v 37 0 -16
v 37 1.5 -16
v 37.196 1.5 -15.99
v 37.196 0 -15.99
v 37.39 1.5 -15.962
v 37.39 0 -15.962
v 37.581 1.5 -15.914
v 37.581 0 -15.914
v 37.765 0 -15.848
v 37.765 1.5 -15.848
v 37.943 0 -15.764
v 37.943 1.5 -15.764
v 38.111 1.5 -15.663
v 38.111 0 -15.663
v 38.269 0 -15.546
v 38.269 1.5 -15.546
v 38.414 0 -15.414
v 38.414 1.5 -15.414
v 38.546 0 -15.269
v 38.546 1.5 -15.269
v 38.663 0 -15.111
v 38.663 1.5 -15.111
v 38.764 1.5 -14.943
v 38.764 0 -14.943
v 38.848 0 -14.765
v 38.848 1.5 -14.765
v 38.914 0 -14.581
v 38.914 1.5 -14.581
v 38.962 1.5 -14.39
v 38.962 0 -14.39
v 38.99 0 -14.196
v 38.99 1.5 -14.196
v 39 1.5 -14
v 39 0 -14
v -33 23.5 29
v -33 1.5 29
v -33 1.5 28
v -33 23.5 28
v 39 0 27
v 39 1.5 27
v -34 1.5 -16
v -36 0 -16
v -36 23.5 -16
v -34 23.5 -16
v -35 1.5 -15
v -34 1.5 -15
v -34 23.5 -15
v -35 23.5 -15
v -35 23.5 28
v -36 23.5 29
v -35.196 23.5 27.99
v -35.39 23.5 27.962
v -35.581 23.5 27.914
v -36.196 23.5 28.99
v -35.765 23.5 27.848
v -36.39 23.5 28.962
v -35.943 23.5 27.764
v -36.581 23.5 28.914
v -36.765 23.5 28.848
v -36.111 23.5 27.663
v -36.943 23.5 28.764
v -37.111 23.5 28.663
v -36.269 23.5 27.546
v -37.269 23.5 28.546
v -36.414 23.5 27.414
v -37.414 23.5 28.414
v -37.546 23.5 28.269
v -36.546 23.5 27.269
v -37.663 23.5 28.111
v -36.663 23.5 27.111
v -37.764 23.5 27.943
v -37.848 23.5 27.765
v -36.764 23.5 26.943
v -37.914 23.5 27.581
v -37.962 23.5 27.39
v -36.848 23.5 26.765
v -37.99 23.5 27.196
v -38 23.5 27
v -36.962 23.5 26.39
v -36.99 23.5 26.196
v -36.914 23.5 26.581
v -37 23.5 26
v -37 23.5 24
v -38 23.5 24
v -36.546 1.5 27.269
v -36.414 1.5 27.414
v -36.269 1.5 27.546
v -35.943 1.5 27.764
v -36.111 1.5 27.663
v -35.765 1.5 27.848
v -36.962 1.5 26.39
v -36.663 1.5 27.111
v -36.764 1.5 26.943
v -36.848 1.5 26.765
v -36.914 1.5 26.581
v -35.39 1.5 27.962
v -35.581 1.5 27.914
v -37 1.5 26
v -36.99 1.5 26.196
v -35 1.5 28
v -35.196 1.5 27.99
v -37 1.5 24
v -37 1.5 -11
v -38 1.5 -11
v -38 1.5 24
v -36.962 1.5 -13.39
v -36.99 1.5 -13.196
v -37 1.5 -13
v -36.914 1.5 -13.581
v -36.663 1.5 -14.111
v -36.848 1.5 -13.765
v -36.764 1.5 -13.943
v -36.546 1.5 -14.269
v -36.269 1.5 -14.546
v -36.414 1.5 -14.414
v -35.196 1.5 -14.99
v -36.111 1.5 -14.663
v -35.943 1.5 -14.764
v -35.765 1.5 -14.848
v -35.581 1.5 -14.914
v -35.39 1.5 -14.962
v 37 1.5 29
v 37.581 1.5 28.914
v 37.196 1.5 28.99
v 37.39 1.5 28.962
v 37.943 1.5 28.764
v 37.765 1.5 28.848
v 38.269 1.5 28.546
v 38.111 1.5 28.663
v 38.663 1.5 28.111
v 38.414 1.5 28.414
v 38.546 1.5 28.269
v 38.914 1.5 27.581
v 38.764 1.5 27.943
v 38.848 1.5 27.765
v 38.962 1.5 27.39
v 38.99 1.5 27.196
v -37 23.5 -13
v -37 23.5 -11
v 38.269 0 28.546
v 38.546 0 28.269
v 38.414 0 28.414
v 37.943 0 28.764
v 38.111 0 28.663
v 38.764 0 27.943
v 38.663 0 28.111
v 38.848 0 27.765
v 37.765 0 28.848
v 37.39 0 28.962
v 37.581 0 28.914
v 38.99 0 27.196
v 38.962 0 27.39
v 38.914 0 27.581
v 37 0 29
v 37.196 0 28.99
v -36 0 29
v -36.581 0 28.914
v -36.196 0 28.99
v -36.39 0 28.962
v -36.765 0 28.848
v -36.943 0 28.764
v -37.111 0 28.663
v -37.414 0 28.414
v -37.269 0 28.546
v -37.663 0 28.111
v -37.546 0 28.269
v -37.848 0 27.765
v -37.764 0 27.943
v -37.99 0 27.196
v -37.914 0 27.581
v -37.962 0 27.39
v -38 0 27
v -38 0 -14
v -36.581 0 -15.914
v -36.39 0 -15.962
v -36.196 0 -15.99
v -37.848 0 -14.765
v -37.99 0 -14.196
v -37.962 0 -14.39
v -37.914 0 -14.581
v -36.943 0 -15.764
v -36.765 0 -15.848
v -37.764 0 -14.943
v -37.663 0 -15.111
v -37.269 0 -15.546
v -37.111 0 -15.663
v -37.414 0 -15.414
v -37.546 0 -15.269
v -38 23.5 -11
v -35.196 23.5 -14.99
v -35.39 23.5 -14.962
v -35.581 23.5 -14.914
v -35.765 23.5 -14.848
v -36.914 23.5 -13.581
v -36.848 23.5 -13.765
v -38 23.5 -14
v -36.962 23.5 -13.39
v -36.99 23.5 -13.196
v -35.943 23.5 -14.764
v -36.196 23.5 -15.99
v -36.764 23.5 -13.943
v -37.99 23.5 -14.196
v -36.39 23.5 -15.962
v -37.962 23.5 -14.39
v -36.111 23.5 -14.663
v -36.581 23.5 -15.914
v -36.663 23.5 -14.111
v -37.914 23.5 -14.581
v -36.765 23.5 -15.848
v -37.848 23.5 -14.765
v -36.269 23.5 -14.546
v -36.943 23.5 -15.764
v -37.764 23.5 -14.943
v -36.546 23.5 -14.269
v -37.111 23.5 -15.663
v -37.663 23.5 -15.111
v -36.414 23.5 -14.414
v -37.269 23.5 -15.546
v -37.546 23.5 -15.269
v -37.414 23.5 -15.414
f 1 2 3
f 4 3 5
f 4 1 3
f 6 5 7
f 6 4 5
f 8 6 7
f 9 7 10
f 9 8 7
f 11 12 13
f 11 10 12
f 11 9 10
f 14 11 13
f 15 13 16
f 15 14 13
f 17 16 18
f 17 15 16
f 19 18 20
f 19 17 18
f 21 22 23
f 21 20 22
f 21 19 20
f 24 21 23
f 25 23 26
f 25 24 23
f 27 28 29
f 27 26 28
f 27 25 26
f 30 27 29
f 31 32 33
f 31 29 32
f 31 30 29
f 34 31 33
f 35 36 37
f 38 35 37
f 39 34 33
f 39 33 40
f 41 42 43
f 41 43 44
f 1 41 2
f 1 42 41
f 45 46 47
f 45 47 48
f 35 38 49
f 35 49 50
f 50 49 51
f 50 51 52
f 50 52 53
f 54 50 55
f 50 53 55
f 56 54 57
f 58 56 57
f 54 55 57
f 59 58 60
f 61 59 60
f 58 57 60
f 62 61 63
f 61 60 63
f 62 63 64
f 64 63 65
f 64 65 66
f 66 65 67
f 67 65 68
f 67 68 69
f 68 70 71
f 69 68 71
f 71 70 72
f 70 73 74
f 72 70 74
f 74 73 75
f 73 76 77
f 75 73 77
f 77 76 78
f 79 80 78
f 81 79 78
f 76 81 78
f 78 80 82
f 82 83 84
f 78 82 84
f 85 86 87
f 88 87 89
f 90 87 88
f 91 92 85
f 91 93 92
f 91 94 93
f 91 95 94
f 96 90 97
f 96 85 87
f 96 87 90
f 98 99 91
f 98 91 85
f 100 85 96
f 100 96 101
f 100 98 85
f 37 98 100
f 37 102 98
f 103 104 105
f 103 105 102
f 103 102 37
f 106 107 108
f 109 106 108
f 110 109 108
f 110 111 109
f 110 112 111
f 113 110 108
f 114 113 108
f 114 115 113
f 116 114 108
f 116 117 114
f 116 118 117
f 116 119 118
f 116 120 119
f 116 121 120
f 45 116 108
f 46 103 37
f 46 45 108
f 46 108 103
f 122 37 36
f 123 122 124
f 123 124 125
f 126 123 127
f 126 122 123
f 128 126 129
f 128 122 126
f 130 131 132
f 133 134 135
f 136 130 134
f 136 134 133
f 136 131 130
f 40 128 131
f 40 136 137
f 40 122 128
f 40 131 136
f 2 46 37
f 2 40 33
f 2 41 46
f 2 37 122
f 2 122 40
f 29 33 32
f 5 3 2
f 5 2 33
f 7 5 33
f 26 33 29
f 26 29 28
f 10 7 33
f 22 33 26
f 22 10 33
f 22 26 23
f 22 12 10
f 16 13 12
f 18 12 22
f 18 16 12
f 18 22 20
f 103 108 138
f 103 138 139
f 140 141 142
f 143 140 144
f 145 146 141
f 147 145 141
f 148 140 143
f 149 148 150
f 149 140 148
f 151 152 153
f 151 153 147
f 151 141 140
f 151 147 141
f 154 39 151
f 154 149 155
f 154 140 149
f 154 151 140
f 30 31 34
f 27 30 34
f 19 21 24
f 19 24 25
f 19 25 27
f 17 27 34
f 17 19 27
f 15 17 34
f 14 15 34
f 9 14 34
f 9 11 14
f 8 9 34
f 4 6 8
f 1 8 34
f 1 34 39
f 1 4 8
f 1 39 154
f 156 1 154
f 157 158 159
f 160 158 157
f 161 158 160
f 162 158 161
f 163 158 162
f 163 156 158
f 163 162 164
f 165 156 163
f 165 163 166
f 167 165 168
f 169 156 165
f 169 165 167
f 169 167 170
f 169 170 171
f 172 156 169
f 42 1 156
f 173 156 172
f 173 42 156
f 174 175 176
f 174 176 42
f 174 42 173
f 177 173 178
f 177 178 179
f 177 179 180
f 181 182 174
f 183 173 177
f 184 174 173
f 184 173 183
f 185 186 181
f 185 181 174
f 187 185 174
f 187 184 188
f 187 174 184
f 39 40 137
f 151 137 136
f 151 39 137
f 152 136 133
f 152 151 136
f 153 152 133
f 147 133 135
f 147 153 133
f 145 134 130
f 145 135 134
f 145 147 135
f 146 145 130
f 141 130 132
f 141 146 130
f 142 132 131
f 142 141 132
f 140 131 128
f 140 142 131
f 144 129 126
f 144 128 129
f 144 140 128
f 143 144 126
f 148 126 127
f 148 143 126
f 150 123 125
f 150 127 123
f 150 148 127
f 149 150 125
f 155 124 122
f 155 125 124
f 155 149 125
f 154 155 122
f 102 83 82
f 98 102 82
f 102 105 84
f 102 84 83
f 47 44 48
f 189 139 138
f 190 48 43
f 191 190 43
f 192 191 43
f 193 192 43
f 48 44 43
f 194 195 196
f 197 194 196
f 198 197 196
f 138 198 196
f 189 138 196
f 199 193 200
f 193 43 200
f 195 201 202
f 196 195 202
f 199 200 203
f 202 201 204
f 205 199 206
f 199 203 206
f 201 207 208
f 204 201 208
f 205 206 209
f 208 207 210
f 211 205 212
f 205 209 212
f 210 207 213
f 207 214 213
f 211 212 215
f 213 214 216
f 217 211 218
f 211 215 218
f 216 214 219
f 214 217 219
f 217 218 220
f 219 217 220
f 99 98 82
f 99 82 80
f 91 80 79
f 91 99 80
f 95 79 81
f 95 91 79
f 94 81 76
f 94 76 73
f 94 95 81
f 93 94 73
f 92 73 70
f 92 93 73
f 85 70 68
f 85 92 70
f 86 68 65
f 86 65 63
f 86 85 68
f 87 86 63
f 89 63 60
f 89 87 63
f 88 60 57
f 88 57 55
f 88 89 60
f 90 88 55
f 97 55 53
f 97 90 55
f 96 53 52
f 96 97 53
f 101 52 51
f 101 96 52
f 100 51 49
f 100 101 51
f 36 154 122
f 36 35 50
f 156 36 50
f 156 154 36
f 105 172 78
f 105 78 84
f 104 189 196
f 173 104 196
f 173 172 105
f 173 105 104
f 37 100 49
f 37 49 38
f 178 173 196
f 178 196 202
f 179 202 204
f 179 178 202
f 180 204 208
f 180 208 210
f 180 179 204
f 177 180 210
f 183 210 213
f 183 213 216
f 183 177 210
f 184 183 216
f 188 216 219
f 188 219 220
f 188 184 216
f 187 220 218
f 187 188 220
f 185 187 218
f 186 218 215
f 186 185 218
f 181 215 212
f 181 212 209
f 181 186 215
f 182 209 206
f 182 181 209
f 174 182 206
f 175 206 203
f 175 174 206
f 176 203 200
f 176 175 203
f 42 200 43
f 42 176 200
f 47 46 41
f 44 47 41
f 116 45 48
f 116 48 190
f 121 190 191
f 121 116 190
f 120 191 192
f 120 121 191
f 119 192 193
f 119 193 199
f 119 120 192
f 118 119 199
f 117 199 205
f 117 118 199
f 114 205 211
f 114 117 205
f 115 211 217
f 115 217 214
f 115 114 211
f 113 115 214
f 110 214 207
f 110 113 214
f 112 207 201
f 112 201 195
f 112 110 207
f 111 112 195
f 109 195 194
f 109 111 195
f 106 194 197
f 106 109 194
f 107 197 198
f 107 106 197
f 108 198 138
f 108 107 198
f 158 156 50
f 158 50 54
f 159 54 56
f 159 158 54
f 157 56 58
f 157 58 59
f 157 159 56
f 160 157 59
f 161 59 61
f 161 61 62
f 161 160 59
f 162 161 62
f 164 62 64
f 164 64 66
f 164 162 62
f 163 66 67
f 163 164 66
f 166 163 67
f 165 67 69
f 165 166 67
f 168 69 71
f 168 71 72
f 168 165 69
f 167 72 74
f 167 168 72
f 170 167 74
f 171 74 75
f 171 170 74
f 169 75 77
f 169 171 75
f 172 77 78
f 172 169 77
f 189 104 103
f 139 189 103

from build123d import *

# Parameters (mm, degrees)
EXTRUDE_1_DEPTH     = 23.5
EXTRUDE_2_DEPTH     = 1.5
SKETCH_6_W          = 1
SKETCH_6_H          = 35
SKETCH_6_W_2        = 69
SKETCH_6_H_2        = 1
SKETCH_6_W_3        = 67
SKETCH_6_H_3        = 37
CUT_EXTRUDE_1_DEPTH = 22
CUT_EXTRUDE_START   = -22
CUT_EXTRUDE_2_DEPTH = 22


with BuildPart() as part:
    # Эскиз3 → Бобышка-Вытянуть1 (new body)
    with BuildSketch(Plane(origin=(0, 0, 0), x_dir=(1, 0, 0), z_dir=(0, 1, 0))):
        with BuildLine():
            Line((-36, 16), (37, 16))
            ThreePointArc((37, 16), (38.414213562, 15.414213562), (39, 14))
            Line((39, 14), (39, -27))
            ThreePointArc((39, -27), (38.414213562, -28.414213562), (37, -29))
            Line((37, -29), (-36, -29))
            ThreePointArc((-36, -29), (-37.414213562, -28.414213562), (-38, -27))
            Line((-38, -27), (-38, 14))
            ThreePointArc((-38, 14), (-37.414213562, 15.414213562), (-36, 16))
        make_face()
        with BuildLine():
            Line((-35, -28), (36, -28))
            ThreePointArc((36, -28), (37.414213562, -27.414213562), (38, -26))
            Line((38, -26), (38, 13))
            ThreePointArc((38, 13), (37.414213562, 14.414213562), (36, 15))
            Line((36, 15), (-35, 15))
            ThreePointArc((-35, 15), (-36.414213562, 14.414213562), (-37, 13))
            Line((-37, 13), (-37, -26))
            ThreePointArc((-37, -26), (-36.414213562, -27.414213562), (-35, -28))
        make_face(mode=Mode.SUBTRACT)
    extrude(amount=EXTRUDE_1_DEPTH)

    # Эскиз3<3> → Бобышка-Вытянуть2 (add)
    with BuildSketch(Plane(origin=(0, 0, 0), x_dir=(1, 0, 0), z_dir=(0, 1, 0))):
        with BuildLine():
            Line((35, 16), (-34, 16))
            Line((-34, 16), (-34, 15))
            Line((-34, 15), (-35, 15))
            ThreePointArc((-35, 15), (-36.414213562, 14.414213562), (-37, 13))
            Line((-37, 13), (-37, 11))
            Line((-37, 11), (-38, 11))
            Line((-38, 11), (-38, -24))
            Line((-38, -24), (-37, -24))
            Line((-37, -24), (-37, -26))
            ThreePointArc((-37, -26), (-36.414213562, -27.414213562), (-35, -28))
            Line((-35, -28), (-33, -28))
            Line((-33, -28), (-33, -29))
            Line((-33, -29), (34, -29))
            Line((34, -29), (34, -28))
            Line((34, -28), (36, -28))
            ThreePointArc((36, -28), (37.414213562, -27.414213562), (38, -26))
            Line((38, -26), (38, -25))
            Line((38, -25), (39, -25))
            Line((39, -25), (39, 12))
            Line((39, 12), (38, 12))
            Line((38, 12), (38, 13))
            ThreePointArc((38, 13), (37.414213562, 14.414213562), (36, 15))
            Line((36, 15), (35, 15))
            Line((35, 15), (35, 16))
        make_face()
    extrude(amount=EXTRUDE_2_DEPTH)

    # Эскиз6 → Вырез-Вытянуть1 (cut)
    with BuildSketch(Plane(origin=(0, 23.5, 0), x_dir=(1, 0, 0), z_dir=(0, 1, 0))):
        with Locations((-37.5, -6.5)):
            Rectangle(SKETCH_6_W, SKETCH_6_H)
        with Locations((0.5, 15.5)):
            Rectangle(SKETCH_6_W_2, SKETCH_6_H_2)
        with Locations((0.5, -28.5)):
            Rectangle(SKETCH_6_W_3, SKETCH_6_H_2)
        with Locations((38.5, -6.5)):
            Rectangle(SKETCH_6_W, SKETCH_6_H_3)
    extrude(amount=-CUT_EXTRUDE_1_DEPTH, mode=Mode.SUBTRACT)

    # Эскиз9 → Вырез-Вытянуть2 (cut)
    with BuildSketch(Plane(origin=(0, 23.5, 0), x_dir=(1, 0, 0), z_dir=(0, 1, 0)).offset(CUT_EXTRUDE_START)):
        with BuildLine():
            Line((38, 12), (39, 12))
            Line((39, 12), (39, 14))
            ThreePointArc((39, 14), (38.414213562, 15.414213562), (37, 16))
            Line((37, 16), (35, 16))
            Line((35, 16), (35, 15))
            Line((35, 15), (36, 15))
            ThreePointArc((36, 15), (37.414213562, 14.414213562), (38, 13))
            Line((38, 13), (38, 12))
        make_face()
        with BuildLine():
            Line((39, -27), (39, -25))
            Line((39, -25), (38, -25))
            Line((38, -25), (38, -26))
            ThreePointArc((38, -26), (37.414213562, -27.414213562), (36, -28))
            Line((36, -28), (34, -28))
            Line((34, -28), (34, -29))
            Line((34, -29), (37, -29))
            ThreePointArc((37, -29), (38.414213562, -28.414213562), (39, -27))
        make_face()
    extrude(amount=CUT_EXTRUDE_2_DEPTH, mode=Mode.SUBTRACT)


solid = part.part
